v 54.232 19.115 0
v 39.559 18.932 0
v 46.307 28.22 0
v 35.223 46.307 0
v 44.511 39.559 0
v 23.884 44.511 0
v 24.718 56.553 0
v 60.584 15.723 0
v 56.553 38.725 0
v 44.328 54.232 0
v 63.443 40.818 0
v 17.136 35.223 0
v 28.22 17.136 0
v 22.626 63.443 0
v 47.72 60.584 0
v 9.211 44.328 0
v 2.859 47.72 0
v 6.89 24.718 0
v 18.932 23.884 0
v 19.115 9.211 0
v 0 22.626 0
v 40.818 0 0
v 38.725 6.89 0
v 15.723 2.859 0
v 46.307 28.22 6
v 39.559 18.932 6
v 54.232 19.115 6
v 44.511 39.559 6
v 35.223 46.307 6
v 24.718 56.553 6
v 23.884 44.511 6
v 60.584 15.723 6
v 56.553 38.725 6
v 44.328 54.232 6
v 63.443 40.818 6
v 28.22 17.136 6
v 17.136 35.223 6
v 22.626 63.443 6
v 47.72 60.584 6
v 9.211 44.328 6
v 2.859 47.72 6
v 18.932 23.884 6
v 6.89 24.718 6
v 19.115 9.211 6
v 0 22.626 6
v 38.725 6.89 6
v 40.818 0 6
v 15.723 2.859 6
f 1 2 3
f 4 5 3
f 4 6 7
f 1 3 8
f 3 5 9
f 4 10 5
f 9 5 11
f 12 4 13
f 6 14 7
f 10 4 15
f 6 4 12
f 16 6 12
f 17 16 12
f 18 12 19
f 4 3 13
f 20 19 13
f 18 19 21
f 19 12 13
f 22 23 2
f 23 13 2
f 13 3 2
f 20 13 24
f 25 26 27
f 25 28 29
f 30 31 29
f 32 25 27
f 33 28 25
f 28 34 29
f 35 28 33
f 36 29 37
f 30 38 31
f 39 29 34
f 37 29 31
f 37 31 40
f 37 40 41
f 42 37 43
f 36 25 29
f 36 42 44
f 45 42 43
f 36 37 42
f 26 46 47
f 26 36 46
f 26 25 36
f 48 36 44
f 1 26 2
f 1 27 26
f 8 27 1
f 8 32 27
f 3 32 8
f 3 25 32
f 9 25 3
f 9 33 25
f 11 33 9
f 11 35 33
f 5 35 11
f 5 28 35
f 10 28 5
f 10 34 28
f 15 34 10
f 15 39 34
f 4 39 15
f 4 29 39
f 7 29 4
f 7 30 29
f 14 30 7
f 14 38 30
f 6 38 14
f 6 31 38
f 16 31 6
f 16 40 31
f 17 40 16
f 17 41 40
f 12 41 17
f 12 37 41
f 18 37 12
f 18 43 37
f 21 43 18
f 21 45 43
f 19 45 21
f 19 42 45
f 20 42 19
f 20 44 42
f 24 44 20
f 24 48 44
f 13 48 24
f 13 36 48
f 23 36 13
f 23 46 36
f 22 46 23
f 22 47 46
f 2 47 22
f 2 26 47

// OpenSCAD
$fn = 32;

// ----------------------------------------------------------------------
// Fan rotor section: 8 blades, 15 mm hub radius, 18 mm blades
// ----------------------------------------------------------------------

// --- parameters (mm) ---
profile_height = 6;       // extrusion height
profile_points = 24;      // points of the closed outline

profile = [[46.307, 28.22], [56.553, 38.725], [63.443, 40.818], [44.511, 39.559], [44.328, 54.232], [47.72, 60.584], [35.223, 46.307], [24.718, 56.553], [22.626, 63.443], [23.884, 44.511], [9.211, 44.328], [2.859, 47.72], [17.136, 35.223], [6.89, 24.718], [0, 22.626], [18.932, 23.884], [19.115, 9.211], [15.723, 2.859], [28.22, 17.136], [38.725, 6.89], [40.818, 0], [39.559, 18.932], [54.232, 19.115], [60.584, 15.723]];  // single closed polygon, 24 points, counter clockwise

// --- the one profile operation ---
linear_extrude(height = profile_height) polygon(points = profile);
